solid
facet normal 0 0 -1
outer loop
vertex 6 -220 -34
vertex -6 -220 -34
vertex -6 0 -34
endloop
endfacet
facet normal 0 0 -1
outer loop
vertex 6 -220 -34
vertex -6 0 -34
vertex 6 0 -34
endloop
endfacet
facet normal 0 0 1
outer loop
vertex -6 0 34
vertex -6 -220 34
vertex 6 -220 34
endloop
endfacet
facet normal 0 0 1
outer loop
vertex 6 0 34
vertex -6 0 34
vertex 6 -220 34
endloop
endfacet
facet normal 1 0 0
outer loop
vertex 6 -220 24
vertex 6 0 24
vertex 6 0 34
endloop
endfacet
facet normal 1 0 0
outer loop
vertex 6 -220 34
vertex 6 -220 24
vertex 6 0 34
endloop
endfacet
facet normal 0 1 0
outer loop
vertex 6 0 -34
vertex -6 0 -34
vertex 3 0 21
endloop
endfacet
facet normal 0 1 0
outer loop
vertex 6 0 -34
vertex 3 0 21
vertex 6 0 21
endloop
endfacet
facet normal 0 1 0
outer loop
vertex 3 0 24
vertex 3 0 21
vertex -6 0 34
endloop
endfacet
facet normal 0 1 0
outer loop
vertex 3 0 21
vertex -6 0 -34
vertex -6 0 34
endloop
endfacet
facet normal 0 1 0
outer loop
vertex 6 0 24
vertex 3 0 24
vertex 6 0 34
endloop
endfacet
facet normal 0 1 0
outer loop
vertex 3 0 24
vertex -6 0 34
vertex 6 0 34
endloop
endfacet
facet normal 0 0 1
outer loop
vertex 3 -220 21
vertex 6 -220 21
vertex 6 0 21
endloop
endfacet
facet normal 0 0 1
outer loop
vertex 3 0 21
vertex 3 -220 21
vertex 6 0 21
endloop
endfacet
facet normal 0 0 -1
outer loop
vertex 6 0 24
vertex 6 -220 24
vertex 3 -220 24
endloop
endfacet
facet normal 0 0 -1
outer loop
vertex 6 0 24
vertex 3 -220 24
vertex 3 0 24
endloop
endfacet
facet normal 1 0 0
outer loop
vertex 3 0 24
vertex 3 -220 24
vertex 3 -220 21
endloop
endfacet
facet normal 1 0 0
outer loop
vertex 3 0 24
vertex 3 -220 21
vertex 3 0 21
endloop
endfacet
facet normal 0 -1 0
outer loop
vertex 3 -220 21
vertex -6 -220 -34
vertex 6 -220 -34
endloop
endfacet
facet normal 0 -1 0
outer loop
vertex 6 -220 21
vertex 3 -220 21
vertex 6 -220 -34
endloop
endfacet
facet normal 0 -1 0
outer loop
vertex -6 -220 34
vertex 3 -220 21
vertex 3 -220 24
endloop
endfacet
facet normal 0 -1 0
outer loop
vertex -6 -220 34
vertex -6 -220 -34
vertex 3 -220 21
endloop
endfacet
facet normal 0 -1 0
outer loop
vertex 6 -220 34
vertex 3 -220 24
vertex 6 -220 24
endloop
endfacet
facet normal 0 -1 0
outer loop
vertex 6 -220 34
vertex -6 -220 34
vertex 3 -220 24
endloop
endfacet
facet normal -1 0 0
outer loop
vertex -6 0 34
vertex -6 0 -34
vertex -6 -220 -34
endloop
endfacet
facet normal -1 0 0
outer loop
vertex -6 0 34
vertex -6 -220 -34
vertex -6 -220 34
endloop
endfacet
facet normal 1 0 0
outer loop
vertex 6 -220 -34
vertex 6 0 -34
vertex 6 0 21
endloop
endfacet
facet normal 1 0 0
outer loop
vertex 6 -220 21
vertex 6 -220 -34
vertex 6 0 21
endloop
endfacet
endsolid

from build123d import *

# Parameters (mm, degrees)
F0_W     = 220
F0_H     = 68
F1_DEPTH = 12
F2_W     = 3
F2_H     = 3
F3_DEPTH = 300
F5_W     = 12
F5_H     = 68
F6_DEPTH = 220
F7_W     = 220
F7_H     = 3
F8_DEPTH = 3


with BuildPart() as f1:
    # F0 (on Front) → F1 (new body)
    with BuildSketch(Plane.XZ):
        Rectangle(F0_W, F0_H)
    extrude(amount=F1_DEPTH)

    # F2 (on face) → F3 (cut)
    with BuildSketch(Plane.YZ.offset(110)):
        with Locations((-1.5, 22.5)):
            Rectangle(F2_W, F2_H)
    extrude(amount=-F3_DEPTH, mode=Mode.SUBTRACT)


with BuildPart() as f6:
    # F5 (on Front) → F6 (new body)
    with BuildSketch(Plane.XZ):
        Rectangle(F5_W, F5_H)
    extrude(amount=F6_DEPTH)

    # F7 (on face) → F8 (cut)
    with BuildSketch(Plane.YZ.offset(6)):
        with Locations((-110, 22.5)):
            Rectangle(F7_W, F7_H)
    extrude(amount=-F8_DEPTH, mode=Mode.SUBTRACT)


solid = f6.part
